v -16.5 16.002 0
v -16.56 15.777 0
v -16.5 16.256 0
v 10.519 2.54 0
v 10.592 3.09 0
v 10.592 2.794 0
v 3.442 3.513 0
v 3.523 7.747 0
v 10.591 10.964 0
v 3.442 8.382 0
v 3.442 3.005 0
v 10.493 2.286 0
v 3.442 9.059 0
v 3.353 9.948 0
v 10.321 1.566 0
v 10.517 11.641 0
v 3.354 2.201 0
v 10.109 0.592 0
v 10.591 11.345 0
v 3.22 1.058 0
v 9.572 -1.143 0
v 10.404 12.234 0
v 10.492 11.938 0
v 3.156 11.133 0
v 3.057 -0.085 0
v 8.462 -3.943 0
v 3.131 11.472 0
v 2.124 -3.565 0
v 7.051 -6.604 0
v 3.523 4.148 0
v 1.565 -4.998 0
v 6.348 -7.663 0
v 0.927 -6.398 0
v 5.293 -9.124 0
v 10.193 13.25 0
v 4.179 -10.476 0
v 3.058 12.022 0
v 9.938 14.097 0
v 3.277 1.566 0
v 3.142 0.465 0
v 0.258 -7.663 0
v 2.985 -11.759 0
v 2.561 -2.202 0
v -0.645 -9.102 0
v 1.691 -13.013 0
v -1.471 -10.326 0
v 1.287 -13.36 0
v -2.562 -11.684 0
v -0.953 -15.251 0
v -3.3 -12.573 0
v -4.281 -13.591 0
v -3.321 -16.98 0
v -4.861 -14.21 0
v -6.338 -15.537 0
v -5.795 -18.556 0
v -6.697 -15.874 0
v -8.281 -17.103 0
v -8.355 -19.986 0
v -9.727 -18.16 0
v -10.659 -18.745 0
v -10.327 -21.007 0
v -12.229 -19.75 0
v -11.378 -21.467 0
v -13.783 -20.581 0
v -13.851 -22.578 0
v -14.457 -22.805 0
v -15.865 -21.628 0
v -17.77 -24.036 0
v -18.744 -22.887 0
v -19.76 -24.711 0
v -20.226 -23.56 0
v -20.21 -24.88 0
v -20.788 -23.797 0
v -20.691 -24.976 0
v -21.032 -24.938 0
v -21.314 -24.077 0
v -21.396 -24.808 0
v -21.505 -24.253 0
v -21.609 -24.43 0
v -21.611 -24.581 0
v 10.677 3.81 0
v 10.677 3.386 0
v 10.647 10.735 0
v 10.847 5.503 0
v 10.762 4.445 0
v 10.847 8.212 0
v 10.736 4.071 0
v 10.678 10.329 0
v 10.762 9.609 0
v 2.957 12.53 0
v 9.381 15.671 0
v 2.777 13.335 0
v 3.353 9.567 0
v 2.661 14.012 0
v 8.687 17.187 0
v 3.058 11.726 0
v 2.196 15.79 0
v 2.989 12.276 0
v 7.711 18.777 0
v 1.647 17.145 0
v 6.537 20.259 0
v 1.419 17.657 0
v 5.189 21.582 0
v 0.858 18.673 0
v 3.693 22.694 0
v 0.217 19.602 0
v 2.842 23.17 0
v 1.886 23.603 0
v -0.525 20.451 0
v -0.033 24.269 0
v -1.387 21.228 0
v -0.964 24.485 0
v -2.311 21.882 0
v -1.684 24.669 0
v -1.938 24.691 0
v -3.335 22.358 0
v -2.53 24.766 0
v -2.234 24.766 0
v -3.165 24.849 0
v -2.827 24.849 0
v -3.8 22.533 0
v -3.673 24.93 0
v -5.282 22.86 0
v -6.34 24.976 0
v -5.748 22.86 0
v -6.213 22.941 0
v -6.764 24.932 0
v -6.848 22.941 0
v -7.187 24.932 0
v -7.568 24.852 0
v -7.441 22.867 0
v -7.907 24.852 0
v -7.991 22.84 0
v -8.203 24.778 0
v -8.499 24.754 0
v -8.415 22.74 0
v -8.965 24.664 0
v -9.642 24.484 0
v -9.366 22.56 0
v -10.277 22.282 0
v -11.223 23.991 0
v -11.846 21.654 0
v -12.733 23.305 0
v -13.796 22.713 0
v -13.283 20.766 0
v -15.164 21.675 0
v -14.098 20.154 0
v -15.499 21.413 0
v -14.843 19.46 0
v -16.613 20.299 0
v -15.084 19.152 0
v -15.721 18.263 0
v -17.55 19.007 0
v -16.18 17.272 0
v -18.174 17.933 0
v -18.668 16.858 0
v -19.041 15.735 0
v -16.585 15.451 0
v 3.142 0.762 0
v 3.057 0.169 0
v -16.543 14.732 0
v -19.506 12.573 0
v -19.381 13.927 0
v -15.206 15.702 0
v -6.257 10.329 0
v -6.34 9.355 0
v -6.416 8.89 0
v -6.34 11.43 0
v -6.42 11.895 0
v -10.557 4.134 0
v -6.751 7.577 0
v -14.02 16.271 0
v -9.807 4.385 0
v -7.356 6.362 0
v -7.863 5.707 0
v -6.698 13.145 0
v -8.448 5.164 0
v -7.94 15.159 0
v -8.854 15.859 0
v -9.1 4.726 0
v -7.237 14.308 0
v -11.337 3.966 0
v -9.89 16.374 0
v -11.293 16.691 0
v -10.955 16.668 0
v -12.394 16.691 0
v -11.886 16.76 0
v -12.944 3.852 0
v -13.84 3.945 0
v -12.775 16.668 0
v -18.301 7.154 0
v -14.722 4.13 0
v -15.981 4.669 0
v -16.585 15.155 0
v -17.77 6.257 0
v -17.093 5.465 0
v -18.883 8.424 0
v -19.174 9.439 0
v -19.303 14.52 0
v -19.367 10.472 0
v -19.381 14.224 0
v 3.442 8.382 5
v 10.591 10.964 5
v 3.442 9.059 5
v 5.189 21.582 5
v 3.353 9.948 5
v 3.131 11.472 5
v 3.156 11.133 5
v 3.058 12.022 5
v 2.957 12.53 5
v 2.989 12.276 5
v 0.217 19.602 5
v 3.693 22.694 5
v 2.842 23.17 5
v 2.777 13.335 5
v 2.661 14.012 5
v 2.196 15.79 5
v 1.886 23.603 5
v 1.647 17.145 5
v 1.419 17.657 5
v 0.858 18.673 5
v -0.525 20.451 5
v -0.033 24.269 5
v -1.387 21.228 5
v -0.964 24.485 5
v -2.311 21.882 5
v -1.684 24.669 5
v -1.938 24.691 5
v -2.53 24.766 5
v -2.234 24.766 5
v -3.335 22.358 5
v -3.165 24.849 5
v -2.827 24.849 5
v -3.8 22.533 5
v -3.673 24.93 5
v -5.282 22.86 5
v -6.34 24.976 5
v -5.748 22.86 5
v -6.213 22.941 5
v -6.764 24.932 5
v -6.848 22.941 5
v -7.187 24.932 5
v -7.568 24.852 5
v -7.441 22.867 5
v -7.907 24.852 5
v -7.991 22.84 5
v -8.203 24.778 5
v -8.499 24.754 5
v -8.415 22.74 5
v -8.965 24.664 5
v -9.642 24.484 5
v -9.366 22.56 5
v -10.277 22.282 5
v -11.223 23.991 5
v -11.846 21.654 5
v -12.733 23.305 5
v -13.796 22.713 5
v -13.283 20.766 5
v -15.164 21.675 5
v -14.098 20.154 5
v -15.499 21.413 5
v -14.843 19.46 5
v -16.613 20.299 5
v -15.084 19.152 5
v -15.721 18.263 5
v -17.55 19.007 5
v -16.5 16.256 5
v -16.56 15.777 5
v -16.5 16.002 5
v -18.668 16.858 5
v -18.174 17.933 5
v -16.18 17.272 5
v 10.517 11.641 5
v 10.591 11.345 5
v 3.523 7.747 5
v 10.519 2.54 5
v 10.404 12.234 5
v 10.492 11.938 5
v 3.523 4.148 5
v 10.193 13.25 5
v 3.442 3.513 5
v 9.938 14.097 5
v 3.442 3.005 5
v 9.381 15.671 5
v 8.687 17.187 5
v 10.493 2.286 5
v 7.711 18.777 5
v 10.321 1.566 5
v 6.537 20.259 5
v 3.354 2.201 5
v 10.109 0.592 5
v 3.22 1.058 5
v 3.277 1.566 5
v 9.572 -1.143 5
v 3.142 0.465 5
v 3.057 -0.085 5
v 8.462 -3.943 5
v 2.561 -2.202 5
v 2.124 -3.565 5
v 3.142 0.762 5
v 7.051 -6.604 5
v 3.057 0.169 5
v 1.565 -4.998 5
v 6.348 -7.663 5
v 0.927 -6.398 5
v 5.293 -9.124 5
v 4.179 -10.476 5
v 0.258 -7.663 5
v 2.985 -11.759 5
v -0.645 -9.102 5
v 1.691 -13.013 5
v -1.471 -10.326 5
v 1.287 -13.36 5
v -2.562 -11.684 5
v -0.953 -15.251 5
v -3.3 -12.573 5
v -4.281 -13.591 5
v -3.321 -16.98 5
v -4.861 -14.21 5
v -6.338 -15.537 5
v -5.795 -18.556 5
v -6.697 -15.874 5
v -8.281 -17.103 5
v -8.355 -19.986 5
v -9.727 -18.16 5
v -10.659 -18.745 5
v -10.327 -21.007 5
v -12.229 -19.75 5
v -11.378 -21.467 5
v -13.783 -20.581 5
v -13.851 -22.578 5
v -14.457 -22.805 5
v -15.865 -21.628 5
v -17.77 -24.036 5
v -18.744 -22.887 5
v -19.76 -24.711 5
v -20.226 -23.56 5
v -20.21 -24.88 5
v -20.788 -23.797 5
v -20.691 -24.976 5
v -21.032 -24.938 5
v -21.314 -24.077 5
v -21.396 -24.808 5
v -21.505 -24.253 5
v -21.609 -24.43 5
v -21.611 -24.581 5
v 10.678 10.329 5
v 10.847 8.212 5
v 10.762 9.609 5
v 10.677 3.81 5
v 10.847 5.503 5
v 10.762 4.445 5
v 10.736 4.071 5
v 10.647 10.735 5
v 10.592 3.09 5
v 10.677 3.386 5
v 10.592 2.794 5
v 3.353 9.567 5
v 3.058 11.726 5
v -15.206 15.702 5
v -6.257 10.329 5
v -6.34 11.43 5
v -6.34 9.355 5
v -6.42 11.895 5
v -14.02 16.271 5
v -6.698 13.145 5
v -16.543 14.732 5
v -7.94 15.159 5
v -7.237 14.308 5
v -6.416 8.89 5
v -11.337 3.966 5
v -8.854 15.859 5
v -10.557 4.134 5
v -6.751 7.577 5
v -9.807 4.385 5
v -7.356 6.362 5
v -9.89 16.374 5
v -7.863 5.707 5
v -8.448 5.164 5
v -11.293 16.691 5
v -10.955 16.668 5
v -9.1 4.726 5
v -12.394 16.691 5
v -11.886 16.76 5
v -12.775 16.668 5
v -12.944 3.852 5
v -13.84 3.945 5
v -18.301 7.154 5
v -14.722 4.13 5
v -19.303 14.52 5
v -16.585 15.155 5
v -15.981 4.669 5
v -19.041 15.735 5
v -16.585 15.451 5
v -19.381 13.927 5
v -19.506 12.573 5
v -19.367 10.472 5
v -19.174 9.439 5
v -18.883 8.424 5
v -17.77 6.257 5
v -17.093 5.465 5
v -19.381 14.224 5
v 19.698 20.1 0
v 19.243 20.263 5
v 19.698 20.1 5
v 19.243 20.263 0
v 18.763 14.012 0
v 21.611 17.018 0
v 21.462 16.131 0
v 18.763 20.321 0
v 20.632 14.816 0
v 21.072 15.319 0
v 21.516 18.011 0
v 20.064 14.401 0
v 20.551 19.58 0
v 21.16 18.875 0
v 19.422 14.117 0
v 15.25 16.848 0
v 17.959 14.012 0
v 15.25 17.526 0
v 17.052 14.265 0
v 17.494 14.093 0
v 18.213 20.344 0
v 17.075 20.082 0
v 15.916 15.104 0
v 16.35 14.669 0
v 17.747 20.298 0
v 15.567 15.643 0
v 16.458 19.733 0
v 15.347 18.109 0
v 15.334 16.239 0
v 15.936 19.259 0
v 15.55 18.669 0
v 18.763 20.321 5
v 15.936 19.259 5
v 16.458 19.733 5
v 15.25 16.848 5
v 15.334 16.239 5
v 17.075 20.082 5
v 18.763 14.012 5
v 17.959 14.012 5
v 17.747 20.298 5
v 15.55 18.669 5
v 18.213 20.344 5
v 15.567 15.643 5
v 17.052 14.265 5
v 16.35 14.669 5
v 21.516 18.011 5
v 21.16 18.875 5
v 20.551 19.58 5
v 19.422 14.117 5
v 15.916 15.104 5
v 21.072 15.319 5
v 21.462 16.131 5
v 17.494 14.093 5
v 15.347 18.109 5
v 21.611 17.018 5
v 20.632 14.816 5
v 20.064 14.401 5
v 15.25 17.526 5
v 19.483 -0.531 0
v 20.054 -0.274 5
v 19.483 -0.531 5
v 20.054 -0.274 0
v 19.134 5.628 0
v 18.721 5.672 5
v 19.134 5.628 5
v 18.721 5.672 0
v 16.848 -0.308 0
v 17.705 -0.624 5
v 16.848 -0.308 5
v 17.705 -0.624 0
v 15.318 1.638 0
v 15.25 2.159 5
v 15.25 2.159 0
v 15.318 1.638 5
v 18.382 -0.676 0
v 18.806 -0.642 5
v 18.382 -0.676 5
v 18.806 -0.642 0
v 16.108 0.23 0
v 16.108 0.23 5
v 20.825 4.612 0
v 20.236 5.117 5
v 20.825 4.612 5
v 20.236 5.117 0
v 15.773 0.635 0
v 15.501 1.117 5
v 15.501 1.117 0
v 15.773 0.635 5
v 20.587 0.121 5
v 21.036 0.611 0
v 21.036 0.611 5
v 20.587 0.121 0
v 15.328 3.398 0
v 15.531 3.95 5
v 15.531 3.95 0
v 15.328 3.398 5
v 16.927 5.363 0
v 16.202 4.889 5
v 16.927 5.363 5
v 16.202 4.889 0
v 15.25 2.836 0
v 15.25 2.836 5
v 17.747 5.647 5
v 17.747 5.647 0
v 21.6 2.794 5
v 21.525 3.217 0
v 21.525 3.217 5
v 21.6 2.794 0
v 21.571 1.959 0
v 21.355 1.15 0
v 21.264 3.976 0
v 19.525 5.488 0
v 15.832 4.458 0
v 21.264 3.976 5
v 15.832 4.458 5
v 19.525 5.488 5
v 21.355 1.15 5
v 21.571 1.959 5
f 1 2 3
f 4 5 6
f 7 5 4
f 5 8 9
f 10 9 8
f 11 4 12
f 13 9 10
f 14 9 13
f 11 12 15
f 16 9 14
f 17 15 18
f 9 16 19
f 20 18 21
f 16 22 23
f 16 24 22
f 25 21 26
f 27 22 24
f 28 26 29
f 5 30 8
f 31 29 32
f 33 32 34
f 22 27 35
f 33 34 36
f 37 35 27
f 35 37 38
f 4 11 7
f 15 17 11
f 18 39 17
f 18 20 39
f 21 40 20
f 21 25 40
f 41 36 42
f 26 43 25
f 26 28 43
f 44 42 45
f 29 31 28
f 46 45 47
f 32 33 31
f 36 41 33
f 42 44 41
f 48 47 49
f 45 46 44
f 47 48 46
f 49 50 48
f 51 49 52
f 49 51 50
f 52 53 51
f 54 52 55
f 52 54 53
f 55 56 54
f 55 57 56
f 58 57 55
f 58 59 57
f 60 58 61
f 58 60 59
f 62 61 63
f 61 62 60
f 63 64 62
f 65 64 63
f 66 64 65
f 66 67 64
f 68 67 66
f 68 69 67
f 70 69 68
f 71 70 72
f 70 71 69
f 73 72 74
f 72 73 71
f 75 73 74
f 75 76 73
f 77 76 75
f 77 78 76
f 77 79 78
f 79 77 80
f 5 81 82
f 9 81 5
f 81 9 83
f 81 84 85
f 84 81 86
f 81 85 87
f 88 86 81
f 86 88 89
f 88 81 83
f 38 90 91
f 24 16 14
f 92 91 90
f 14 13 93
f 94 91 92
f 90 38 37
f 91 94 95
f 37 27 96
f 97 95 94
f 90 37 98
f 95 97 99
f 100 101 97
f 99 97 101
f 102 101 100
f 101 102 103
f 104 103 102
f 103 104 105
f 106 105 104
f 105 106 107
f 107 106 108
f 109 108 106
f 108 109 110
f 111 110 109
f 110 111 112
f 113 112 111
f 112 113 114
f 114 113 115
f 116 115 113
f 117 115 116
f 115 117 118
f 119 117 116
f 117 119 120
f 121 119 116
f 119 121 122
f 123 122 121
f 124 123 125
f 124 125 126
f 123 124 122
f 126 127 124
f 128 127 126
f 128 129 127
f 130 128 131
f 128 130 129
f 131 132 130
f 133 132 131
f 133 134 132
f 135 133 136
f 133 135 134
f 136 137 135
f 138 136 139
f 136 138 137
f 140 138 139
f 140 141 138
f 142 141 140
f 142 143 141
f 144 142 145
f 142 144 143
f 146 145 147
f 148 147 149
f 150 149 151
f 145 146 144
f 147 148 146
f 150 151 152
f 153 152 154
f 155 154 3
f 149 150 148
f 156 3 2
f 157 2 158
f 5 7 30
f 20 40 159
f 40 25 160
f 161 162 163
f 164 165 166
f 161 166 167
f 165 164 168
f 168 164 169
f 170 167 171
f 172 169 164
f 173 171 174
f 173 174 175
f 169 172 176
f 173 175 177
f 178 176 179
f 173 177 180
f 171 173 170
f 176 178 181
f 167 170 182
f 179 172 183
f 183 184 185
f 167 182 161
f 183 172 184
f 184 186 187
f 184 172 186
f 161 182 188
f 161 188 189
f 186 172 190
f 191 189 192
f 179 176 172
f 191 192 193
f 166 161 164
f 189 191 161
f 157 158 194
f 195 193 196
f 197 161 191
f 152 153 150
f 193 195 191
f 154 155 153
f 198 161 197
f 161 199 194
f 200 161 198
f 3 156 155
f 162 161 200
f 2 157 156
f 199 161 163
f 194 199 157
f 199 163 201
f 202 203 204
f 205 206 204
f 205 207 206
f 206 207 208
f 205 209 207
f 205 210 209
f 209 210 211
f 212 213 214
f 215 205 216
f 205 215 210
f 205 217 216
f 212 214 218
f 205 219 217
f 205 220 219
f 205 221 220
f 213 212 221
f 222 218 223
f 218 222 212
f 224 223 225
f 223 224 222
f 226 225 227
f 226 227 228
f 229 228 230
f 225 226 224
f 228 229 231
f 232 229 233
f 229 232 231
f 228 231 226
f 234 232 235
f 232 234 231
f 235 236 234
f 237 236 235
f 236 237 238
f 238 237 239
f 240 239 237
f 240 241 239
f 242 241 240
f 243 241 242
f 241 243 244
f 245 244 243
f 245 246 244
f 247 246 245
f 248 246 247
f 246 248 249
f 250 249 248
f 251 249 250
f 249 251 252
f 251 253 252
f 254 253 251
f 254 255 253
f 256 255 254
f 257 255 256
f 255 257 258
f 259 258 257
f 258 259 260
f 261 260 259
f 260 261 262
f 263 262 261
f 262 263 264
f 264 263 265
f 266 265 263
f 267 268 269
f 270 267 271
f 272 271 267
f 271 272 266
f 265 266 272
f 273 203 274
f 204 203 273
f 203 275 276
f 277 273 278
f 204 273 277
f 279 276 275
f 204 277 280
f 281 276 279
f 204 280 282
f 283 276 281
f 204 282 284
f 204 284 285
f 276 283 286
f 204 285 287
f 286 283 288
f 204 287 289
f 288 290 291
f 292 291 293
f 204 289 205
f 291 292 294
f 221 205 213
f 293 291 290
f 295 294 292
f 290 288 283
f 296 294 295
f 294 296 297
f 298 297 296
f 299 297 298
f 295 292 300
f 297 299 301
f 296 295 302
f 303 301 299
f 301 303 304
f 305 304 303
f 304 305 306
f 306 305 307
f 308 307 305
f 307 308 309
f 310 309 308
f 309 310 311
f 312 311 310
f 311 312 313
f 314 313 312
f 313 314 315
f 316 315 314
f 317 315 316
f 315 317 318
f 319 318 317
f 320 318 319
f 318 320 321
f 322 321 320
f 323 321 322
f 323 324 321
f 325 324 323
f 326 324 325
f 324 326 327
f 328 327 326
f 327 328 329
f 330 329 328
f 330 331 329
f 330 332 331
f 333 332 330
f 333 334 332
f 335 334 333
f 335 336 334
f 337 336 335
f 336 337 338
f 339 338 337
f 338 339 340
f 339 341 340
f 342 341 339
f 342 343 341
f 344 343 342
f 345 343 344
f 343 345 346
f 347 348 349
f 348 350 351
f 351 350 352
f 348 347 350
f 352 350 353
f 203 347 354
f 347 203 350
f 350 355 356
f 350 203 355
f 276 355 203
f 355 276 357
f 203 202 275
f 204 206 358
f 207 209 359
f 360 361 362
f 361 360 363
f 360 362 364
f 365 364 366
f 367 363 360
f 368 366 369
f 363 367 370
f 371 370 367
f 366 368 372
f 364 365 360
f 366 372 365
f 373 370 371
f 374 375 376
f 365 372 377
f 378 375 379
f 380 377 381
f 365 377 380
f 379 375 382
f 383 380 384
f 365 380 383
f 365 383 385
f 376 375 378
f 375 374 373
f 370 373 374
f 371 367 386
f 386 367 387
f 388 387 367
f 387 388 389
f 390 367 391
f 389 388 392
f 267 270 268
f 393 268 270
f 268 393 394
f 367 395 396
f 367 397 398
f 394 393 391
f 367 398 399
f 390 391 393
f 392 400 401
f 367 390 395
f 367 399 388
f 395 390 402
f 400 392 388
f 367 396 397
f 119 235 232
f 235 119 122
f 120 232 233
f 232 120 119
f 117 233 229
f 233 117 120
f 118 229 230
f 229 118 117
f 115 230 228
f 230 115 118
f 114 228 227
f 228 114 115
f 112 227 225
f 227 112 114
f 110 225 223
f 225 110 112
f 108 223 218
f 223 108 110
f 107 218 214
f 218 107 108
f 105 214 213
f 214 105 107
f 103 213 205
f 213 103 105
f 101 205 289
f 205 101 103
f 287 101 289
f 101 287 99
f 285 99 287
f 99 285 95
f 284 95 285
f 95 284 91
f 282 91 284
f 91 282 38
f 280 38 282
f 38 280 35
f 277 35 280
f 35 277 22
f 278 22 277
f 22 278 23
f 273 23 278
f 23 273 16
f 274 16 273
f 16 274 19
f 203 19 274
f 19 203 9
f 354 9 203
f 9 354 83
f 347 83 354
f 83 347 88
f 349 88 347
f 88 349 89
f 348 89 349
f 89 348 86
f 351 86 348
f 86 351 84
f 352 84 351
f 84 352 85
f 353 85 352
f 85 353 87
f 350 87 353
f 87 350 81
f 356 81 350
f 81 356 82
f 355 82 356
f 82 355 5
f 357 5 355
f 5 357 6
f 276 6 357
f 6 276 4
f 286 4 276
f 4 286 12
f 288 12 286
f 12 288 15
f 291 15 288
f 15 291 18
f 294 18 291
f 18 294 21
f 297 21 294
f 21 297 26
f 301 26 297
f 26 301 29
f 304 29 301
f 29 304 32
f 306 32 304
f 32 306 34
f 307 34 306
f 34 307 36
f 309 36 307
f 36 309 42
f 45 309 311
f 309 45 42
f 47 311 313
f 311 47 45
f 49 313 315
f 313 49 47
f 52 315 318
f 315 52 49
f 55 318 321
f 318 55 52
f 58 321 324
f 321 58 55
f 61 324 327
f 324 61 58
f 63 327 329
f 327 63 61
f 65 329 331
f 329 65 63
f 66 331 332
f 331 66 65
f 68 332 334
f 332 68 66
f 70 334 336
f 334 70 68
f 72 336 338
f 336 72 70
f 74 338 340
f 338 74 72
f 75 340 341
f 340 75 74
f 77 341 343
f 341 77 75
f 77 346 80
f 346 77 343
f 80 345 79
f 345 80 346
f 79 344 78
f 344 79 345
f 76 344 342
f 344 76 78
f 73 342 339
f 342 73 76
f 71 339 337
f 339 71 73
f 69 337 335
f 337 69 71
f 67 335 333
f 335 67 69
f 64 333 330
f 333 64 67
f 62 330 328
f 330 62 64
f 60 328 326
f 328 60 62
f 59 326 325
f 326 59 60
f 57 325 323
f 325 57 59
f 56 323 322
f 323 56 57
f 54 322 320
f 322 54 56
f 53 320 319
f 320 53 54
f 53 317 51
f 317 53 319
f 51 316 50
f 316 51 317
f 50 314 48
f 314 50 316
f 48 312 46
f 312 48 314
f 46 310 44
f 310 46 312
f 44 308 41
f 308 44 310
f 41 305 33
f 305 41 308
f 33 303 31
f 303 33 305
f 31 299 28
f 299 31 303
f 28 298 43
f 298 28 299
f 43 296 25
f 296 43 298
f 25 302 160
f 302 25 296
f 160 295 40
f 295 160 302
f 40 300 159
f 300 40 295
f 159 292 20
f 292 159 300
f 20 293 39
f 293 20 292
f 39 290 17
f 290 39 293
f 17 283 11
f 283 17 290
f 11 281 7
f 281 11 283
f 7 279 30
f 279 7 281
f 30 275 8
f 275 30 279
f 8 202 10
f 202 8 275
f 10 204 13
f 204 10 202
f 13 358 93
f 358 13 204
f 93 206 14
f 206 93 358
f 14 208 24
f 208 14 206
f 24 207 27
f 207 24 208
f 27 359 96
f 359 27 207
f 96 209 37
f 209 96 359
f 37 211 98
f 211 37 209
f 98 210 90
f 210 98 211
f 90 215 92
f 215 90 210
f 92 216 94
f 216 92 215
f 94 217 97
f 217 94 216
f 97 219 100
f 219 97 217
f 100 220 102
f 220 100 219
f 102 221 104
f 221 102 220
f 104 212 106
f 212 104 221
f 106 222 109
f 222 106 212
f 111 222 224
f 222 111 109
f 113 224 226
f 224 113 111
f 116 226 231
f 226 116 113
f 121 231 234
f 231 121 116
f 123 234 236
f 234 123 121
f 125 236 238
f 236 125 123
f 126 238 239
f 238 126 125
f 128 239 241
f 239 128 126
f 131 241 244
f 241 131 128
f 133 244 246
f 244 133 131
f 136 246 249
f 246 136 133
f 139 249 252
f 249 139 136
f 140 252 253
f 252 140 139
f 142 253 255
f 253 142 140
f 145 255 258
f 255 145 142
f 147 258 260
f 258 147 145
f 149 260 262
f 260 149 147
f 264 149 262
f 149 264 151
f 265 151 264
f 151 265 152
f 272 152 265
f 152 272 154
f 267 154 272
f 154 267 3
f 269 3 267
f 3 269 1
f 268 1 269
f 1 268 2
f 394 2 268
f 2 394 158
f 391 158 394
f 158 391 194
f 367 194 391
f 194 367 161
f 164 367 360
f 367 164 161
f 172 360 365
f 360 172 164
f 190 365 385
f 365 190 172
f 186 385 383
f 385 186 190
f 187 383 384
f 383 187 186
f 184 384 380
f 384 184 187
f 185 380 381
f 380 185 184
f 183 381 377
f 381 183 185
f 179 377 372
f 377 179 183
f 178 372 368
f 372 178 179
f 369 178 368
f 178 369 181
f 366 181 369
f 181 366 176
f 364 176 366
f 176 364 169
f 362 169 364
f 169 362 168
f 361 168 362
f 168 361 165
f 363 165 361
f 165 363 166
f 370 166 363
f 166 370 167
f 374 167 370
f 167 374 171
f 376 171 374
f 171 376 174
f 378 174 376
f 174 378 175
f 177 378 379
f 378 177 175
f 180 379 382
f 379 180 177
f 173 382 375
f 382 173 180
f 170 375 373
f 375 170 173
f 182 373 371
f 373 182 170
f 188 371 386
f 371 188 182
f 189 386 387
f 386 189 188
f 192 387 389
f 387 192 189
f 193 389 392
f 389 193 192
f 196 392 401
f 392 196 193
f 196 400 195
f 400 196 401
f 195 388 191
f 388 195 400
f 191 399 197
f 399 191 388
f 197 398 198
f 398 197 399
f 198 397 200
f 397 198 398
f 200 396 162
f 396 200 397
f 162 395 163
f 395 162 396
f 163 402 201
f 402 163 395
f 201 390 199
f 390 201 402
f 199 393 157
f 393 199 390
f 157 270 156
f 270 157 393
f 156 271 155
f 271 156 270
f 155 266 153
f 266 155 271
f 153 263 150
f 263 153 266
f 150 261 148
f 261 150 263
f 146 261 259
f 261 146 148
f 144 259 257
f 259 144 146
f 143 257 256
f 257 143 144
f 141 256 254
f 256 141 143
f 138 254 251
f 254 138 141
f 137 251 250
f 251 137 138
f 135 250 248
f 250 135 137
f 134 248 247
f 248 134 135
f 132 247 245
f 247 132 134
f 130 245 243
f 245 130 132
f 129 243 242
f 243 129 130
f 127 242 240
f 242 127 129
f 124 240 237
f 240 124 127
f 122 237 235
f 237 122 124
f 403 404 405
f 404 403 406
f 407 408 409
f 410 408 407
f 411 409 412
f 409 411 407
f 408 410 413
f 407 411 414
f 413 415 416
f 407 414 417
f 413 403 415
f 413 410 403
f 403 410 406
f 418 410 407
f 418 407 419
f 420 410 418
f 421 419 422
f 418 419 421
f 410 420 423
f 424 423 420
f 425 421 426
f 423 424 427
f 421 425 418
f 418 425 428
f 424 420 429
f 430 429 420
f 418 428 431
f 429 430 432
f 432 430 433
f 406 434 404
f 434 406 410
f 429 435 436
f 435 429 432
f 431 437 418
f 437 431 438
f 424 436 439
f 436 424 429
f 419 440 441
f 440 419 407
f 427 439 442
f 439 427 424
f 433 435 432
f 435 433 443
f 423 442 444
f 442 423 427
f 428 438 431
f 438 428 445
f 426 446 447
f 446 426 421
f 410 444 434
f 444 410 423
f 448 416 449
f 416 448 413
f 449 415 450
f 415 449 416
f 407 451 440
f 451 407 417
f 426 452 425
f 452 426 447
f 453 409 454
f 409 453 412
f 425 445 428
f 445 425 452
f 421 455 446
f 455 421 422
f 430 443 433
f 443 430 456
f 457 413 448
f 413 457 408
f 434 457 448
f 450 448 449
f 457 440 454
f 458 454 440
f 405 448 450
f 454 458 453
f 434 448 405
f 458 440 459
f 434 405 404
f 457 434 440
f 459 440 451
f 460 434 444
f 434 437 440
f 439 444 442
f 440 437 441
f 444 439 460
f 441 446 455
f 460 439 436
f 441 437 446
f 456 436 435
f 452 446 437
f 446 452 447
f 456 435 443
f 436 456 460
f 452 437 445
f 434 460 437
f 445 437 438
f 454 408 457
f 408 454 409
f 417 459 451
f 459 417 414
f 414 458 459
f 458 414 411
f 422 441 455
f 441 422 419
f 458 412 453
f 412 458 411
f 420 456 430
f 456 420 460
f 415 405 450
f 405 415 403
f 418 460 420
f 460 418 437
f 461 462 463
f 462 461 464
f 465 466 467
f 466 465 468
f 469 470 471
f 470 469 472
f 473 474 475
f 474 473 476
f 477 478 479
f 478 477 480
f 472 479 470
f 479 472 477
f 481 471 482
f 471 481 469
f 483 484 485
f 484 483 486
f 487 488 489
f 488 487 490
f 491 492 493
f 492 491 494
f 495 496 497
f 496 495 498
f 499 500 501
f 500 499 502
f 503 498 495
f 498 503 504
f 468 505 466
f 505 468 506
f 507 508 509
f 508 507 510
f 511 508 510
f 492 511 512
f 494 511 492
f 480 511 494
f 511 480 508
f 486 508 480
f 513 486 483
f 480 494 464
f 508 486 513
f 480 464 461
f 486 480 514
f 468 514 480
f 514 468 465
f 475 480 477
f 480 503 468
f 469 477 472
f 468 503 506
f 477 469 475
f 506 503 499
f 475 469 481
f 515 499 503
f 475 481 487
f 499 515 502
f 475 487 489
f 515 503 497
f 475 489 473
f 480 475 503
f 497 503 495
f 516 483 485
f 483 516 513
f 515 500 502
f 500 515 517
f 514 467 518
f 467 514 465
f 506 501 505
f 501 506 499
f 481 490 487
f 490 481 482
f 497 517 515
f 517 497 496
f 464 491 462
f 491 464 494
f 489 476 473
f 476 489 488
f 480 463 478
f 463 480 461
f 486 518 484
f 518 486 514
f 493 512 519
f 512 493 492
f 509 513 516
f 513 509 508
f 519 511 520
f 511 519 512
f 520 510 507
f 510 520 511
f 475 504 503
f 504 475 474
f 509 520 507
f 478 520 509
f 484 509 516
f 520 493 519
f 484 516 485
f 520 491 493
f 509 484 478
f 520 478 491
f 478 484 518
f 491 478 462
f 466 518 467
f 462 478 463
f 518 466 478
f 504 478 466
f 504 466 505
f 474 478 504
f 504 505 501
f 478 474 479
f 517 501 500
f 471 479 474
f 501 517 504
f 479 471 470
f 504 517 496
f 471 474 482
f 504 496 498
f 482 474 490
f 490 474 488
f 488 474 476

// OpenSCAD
// Module names are of the form poly_<inkscape-path-id>().  As a result,
// you can associate a polygon in this OpenSCAD program with the corresponding
// SVG element in the Inkscape document by looking for the XML element with
// the attribute id="inkscape-path-id".

// fudge value is used to ensure that subtracted solids are a tad taller
// in the z dimension than the polygon being subtracted from.  This helps
// keep the resulting .stl file manifold.
fudge = 0.1;

module baseclef15scale(h)
{
  scale([25.4/90, -25.4/90, 1]) union()
  {
    linear_extrude(height=h)
      polygon([[-53.879273,-55.635750],[-49.678523,-57.651750],[-45.266273,-59.060250],[-43.916273,-59.142750],[-42.116273,-59.387250],[-40.016273,-59.141250],[-38.816273,-59.060250],[-35.041594,-58.017938],[-31.373086,-56.193750],[-28.132922,-53.712563],[-25.643273,-50.699250],[-23.732648,-46.578375],[-22.746773,-42.149250],[-22.466273,-40.499250],[-22.169273,-36.599250],[-22.466273,-33.149250],[-22.734773,-31.499250],[-23.921461,-26.847000],[-26.063273,-22.541250],[-27.860599,-20.221860],[-29.935219,-18.298102],[-32.245351,-16.744714],[-34.749211,-15.536438],[-37.405017,-14.648013],[-40.170984,-14.054180],[-45.866273,-13.649250],[-49.038211,-13.977750],[-52.166273,-14.634750],[-56.627273,-16.542000],[-60.566273,-19.362750],[-62.965898,-22.170938],[-64.845773,-25.349250],[-66.906773,-29.849250],[-67.938398,-33.444234],[-68.623523,-37.107000],[-69.116273,-44.549250],[-68.672273,-49.349250],[-68.672273,-50.399250],[-68.394773,-51.449250],[-67.468758,-55.755070],[-66.147023,-59.731688],[-64.396664,-63.542086],[-62.184773,-67.349250],[-58.863773,-71.924250],[-54.917273,-75.872250],[-53.729273,-76.800750],[-48.884273,-80.480250],[-45.116273,-82.575750],[-39.767836,-85.007250],[-34.166273,-86.754750],[-31.766273,-87.393750],[-30.116273,-87.710250],[-29.066273,-87.797250],[-28.016273,-88.056750],[-26.816273,-88.056750],[-25.466273,-88.343250],[-23.966273,-88.343250],[-22.466273,-88.499250],[-13.016273,-88.335750],[-11.216273,-88.046250],[-10.016273,-88.046250],[-8.966273,-87.755250],[-7.916273,-87.755250],[-6.866273,-87.488250],[-5.966273,-87.410250],[-3.416273,-86.756250],[-0.116273,-85.992750],[6.681914,-83.633625],[10.069266,-82.097156],[13.085227,-80.412750],[18.385805,-76.472977],[23.161852,-71.784937],[27.323086,-66.532430],[30.779227,-60.899250],[33.239414,-55.528312],[35.214727,-49.949250],[36.116227,-46.949250],[36.863227,-43.349250],[37.176727,-42.299250],[37.265227,-41.249250],[37.527727,-40.199250],[37.527727,-38.849250],[37.726852,-38.037000],[37.833727,-36.599250],[38.133727,-34.049250],[38.433727,-29.099250],[38.433727,-19.499250],[38.133727,-15.749250],[38.041477,-14.423437],[37.832227,-13.499250],[37.832227,-11.999250],[37.530727,-10.949250],[37.530727,-9.899250],[37.272727,-8.999250],[37.178227,-8.099250],[36.572227,-5.549250],[35.817727,-2.099250],[33.915727,4.050750],[29.984977,13.970438],[24.983227,23.400750],[22.493227,27.150750],[18.755109,32.327648],[14.807039,37.119937],[10.576312,41.667258],[5.990227,46.109250],[4.559227,47.337750],[-3.378047,54.038203],[-11.767711,60.166875],[-20.534531,65.750484],[-29.603273,70.815750],[-36.591773,74.433750],[-40.316273,76.064250],[-49.079273,80.001750],[-51.224273,80.804250],[-62.966273,85.167750],[-70.016273,87.557250],[-71.610023,88.156500],[-73.316273,88.499250],[-74.524008,88.363430],[-75.811898,87.900938],[-76.572727,87.096727],[-76.565736,86.561774],[-76.199273,85.935750],[-75.521273,85.313250],[-73.657898,84.321188],[-71.666273,83.478750],[-66.416273,81.095250],[-56.216273,76.634250],[-48.836273,72.926250],[-43.329773,69.981750],[-37.767773,66.417750],[-34.466273,64.344750],[-29.340773,60.600750],[-23.730773,56.244750],[-22.458773,55.052250],[-17.222273,50.349750],[-15.168773,48.156750],[-11.691773,44.550750],[-9.078773,41.399250],[-5.213273,36.587250],[-2.285273,32.250750],[0.912727,27.150750],[3.285656,22.670156],[5.544539,17.708625],[7.527516,12.630656],[9.072727,7.800750],[10.830727,0.300750],[10.830727,-0.599250],[11.133727,-1.649250],[11.133727,-2.699250],[11.408227,-3.749250],[11.610727,-5.549250],[11.883727,-7.799250],[12.197227,-10.649250],[12.197227,-12.449250],[12.483727,-14.699250],[12.483727,-27.449250],[12.195727,-29.699250],[12.195727,-32.099250],[11.879227,-33.899250],[11.879227,-35.249250],[11.181727,-39.449250],[11.094727,-40.649250],[10.836727,-41.549250],[10.836727,-42.599250],[10.589227,-43.499250],[10.478227,-44.399250],[9.839227,-47.249250],[9.428227,-49.649250],[7.781227,-55.949250],[5.837227,-60.749250],[5.028727,-62.562750],[3.038812,-66.165844],[0.767789,-69.456750],[-1.859016,-72.464156],[-4.916273,-75.216750],[-8.188523,-77.533687],[-11.816273,-79.221750],[-13.466273,-79.842750],[-18.716273,-80.999250],[-20.366273,-80.999250],[-22.016273,-81.285750],[-24.266273,-81.285750],[-26.366273,-81.024750],[-28.316273,-80.930250],[-29.816273,-80.576250],[-33.188273,-79.936125],[-36.416273,-78.951750],[-41.974711,-76.728187],[-47.066273,-73.578750],[-49.952086,-71.410875],[-52.593773,-68.952750],[-53.447273,-67.862250],[-55.706086,-64.713000],[-57.329273,-61.199250],[-58.463273,-57.599250],[-58.463273,-56.699250],[-58.677773,-55.902562],[-58.766273,-54.749250],[-58.766273,-53.699250],[-58.616273,-52.199250],[-53.879273,-55.635750]]);
    linear_extrude(height=h)
      polygon([[66.483727,-72.005250],[68.183789,-71.796375],[69.797227,-71.220750],[72.819727,-69.378844],[74.975977,-66.879375],[76.236727,-63.820219],[76.572727,-60.299250],[76.046039,-57.155813],[74.663227,-54.281250],[73.105477,-52.499016],[71.092102,-51.025875],[68.819414,-50.022422],[66.483727,-49.649250],[63.633727,-49.649250],[61.985227,-49.936125],[60.422227,-50.544750],[57.933727,-51.977250],[56.394117,-53.517938],[55.157977,-55.426500],[54.334711,-57.540938],[54.033727,-59.699250],[54.033727,-62.099250],[54.380414,-64.165313],[55.097227,-66.149250],[56.467852,-68.241023],[58.316602,-69.921188],[60.502289,-71.158383],[62.883727,-71.921250],[64.533727,-72.086250],[66.483727,-72.005250]]);
    linear_extrude(height=h)
      polygon([[66.333727,-20.099250],[67.796414,-19.941750],[69.183727,-19.445250],[71.702930,-18.132797],[73.788727,-16.340250],[75.343523,-14.088703],[76.269727,-11.399250],[76.533727,-9.899250],[76.432664,-6.941438],[75.666727,-4.074750],[74.536453,-2.163844],[72.945914,-0.429000],[71.057531,0.971719],[69.033727,1.880250],[66.633727,2.276250],[65.133727,2.394750],[62.733727,2.211750],[59.699039,1.090500],[57.077227,-0.813750],[55.890188,-2.251781],[54.926039,-3.959250],[54.276609,-5.802844],[54.033727,-7.649250],[54.033727,-10.049250],[54.311344,-12.041531],[55.031789,-13.997250],[56.097328,-15.797719],[57.410227,-17.324250],[59.976539,-19.003875],[62.883727,-20.010750],[66.333727,-20.099250]]);
  }
}

baseclef15scale(5);
